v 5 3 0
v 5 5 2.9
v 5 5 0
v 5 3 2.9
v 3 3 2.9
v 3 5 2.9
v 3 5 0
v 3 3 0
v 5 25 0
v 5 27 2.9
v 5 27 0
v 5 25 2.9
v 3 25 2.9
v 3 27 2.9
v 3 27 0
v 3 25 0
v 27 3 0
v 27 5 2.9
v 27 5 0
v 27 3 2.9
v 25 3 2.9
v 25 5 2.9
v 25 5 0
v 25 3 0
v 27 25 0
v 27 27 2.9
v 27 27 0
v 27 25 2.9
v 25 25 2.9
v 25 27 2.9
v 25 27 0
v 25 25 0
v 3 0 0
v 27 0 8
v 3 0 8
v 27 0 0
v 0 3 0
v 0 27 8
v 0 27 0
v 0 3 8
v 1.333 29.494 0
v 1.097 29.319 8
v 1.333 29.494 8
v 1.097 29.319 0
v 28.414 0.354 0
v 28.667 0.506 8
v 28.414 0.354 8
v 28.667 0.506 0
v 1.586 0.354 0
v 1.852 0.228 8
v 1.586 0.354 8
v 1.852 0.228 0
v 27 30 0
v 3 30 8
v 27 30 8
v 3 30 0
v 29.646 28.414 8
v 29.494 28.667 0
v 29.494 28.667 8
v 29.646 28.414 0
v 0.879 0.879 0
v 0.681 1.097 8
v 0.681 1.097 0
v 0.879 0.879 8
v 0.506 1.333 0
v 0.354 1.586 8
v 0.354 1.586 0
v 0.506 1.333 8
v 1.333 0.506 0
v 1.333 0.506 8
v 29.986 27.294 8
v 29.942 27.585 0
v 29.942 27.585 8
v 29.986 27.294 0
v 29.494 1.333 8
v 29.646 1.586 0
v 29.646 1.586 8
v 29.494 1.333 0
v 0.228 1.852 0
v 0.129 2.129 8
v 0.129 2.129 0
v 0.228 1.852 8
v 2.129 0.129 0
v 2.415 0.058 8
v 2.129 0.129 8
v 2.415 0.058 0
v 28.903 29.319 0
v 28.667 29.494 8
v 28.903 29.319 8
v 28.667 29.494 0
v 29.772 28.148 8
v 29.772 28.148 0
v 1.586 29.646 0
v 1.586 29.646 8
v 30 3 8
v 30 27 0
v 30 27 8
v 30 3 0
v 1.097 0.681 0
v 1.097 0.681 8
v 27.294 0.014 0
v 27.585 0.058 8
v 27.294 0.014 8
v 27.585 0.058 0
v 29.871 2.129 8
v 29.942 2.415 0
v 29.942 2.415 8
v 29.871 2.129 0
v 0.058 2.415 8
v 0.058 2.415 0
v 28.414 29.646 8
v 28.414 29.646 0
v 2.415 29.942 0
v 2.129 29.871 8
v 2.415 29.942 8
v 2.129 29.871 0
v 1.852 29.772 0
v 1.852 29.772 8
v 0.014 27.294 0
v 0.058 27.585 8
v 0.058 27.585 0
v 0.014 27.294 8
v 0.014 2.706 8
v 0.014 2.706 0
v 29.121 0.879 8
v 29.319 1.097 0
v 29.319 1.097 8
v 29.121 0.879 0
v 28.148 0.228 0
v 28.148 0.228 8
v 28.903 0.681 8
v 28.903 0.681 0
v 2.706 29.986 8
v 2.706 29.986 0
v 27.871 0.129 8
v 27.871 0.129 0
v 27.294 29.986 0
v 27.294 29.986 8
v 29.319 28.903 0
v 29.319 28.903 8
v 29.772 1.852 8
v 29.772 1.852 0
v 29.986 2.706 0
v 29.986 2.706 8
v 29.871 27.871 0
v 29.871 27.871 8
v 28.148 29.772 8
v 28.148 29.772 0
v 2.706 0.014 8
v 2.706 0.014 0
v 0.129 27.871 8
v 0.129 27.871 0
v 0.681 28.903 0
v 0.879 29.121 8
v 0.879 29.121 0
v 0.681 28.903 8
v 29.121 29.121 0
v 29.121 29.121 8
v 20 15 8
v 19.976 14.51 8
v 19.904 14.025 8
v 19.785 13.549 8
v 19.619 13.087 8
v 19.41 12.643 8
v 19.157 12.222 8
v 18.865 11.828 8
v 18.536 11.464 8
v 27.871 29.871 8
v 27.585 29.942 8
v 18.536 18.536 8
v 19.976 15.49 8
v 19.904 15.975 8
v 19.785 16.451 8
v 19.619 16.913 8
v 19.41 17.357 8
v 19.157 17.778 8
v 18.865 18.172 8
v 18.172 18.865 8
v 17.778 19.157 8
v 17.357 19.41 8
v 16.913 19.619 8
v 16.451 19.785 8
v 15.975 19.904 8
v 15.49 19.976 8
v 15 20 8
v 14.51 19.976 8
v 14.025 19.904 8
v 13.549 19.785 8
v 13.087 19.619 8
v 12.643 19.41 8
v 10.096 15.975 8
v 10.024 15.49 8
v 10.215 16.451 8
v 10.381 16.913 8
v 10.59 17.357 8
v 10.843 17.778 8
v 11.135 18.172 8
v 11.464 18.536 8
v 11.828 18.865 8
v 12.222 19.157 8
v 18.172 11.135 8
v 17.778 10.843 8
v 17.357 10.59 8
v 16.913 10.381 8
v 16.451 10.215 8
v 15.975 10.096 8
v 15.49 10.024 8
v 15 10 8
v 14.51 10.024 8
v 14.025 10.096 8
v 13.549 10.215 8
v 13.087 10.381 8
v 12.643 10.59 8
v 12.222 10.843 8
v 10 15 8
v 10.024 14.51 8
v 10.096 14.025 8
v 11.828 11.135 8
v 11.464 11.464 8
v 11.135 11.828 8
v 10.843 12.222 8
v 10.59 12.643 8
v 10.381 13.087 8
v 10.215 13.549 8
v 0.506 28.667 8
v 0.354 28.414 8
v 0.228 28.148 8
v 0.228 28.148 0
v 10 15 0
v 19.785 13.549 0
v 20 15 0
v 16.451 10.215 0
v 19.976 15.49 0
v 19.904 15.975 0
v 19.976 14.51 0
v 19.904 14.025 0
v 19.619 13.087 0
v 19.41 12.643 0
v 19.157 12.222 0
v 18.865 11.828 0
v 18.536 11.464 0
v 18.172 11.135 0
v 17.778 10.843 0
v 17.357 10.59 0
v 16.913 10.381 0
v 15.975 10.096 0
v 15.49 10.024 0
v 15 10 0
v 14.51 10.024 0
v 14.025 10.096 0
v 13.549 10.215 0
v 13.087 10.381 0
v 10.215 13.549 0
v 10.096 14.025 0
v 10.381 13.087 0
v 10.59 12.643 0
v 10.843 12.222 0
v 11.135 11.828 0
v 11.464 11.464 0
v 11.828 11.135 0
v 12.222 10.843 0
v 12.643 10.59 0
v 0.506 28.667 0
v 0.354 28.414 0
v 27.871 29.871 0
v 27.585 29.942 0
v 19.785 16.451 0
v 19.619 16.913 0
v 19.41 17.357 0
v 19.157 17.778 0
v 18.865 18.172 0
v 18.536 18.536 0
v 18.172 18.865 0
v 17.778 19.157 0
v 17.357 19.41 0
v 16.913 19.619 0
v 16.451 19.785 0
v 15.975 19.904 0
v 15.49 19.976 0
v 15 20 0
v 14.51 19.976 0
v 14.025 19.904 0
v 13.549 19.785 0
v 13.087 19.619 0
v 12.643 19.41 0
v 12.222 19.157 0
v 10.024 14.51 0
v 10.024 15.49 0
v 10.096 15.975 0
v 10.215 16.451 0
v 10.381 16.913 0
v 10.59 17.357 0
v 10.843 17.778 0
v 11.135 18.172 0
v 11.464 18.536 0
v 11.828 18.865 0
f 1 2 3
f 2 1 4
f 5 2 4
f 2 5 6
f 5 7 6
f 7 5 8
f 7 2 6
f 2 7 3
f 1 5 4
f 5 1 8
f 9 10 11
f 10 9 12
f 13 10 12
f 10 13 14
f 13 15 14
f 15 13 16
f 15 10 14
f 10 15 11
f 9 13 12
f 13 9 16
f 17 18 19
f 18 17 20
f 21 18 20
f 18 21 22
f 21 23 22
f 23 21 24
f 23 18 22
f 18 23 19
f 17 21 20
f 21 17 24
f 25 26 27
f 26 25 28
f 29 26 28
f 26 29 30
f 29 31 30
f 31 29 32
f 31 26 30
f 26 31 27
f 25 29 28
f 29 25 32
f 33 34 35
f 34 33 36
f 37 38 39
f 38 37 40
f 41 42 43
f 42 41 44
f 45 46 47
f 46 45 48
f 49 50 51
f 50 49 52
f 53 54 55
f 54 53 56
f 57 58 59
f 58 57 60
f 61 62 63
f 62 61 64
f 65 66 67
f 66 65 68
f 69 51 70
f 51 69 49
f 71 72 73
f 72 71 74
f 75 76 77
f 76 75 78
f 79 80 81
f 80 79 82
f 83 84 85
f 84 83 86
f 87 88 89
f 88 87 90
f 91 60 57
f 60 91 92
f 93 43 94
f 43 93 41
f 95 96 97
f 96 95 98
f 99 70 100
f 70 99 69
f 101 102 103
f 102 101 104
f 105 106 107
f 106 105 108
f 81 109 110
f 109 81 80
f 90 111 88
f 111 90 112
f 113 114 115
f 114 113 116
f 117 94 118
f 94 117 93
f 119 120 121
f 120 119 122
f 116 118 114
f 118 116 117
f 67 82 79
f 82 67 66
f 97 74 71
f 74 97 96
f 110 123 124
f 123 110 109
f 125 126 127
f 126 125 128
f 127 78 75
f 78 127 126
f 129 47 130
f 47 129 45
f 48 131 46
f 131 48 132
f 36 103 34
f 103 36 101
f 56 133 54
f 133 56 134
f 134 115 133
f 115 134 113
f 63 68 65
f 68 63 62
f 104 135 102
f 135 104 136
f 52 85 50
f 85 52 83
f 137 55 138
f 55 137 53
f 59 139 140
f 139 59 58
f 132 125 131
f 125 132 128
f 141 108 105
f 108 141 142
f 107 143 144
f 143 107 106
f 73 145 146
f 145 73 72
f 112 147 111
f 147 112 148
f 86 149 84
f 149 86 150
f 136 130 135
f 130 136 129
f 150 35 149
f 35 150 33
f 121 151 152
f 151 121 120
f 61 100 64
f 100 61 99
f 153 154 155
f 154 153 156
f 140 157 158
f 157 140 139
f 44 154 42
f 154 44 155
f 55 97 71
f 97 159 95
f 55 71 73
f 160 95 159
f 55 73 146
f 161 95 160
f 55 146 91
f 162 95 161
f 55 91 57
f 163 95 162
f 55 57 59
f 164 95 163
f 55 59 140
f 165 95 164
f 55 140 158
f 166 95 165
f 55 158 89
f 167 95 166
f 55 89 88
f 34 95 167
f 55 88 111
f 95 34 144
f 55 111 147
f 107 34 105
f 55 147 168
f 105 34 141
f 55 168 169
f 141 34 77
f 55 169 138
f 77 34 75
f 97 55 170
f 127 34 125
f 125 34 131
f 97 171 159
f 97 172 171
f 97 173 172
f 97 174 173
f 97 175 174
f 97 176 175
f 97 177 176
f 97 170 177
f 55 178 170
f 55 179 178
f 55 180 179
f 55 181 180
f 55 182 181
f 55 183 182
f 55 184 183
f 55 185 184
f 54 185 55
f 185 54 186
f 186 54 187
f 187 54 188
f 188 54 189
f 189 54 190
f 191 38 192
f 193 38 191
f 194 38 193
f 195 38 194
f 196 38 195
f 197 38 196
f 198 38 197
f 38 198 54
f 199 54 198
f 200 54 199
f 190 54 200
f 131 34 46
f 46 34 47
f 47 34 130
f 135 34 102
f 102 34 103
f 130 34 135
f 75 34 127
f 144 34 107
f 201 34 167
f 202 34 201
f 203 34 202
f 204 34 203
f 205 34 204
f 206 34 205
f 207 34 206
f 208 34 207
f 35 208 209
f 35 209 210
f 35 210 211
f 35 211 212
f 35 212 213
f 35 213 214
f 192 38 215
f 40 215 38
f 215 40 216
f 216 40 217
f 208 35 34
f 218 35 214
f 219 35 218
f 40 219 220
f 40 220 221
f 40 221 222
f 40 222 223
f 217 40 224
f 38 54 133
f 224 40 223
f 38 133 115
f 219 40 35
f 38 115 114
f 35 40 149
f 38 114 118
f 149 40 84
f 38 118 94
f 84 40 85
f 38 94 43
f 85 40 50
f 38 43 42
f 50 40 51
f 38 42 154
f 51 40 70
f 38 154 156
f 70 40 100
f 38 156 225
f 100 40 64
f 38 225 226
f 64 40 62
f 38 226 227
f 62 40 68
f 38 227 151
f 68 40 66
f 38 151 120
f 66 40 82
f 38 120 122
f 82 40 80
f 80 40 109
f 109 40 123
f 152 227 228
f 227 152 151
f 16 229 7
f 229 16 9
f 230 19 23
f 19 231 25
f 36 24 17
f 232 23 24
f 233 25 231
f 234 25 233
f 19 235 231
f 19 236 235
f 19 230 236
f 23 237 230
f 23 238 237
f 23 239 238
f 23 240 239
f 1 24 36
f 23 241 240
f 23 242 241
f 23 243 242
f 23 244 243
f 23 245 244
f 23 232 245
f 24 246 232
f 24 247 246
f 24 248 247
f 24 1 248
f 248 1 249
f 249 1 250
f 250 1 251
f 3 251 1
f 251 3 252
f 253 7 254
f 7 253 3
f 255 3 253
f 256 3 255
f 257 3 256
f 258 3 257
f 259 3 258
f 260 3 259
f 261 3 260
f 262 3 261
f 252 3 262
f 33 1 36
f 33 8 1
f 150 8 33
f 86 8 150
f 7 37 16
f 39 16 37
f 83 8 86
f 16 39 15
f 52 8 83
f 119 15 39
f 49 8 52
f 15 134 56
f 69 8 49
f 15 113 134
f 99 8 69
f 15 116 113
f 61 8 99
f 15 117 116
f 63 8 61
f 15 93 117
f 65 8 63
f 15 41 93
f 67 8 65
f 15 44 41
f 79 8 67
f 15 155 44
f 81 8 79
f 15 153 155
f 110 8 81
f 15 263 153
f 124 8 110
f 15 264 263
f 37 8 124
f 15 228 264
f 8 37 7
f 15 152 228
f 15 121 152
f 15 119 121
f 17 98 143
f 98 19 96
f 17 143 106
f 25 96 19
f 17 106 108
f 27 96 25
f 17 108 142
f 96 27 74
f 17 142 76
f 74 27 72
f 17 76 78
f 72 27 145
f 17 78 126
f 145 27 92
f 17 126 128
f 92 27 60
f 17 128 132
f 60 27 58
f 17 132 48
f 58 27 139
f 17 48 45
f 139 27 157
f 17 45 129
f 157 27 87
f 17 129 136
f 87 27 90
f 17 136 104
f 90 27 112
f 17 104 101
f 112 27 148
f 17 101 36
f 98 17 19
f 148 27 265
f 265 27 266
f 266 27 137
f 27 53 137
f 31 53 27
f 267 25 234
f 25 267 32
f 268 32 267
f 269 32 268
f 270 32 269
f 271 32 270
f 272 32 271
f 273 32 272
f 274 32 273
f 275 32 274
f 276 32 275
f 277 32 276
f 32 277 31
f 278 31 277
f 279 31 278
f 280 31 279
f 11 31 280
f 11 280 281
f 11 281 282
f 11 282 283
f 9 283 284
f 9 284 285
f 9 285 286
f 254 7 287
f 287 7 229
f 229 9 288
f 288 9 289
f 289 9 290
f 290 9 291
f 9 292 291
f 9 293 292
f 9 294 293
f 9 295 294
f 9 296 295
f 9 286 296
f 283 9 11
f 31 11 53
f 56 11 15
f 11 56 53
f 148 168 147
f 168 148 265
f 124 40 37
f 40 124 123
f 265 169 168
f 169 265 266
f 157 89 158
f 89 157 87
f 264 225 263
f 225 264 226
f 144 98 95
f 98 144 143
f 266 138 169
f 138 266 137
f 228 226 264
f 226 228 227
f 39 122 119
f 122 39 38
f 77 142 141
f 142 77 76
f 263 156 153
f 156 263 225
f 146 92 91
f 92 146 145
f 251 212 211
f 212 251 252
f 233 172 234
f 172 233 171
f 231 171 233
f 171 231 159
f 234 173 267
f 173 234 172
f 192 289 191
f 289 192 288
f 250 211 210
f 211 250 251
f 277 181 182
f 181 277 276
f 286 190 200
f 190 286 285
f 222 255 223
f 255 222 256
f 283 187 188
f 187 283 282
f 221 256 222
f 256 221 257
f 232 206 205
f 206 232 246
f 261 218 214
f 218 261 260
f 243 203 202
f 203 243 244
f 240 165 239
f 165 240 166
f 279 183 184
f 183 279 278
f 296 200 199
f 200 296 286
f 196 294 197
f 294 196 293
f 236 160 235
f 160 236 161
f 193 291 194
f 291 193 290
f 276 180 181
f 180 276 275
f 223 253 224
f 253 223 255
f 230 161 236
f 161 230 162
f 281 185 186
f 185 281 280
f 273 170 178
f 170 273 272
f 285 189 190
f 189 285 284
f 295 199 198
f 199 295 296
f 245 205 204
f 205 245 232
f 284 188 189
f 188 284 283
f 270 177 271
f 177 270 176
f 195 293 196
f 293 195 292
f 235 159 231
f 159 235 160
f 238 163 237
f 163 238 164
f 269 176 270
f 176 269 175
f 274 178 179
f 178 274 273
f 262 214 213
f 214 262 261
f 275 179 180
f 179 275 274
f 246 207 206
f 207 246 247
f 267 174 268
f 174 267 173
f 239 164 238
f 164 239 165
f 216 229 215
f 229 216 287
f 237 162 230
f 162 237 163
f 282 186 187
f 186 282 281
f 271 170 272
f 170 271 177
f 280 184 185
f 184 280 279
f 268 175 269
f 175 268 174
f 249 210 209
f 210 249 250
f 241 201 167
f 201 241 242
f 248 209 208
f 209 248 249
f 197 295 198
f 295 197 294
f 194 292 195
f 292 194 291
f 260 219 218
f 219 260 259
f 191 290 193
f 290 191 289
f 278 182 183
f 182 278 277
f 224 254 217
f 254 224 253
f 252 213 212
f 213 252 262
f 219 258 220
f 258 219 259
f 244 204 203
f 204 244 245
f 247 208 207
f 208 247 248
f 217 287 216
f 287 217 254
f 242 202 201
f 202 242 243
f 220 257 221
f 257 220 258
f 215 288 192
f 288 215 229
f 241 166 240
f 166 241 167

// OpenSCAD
// file: params.scad
// Cat Feeder 5000 — Shared Parameters & Common Modules
// Include this file first in all part files: include <params.scad>

// ===== DIMENSIONS =====
WALL = 3;                // Standard wall thickness (mm)
THIN_WALL = 2.5;         // Thin walls (antenna arch, etc.)
FLOOR = 4;               // Base floor thickness
INSERT_BORE = 4.7;       // M3 heat-set insert pocket bore
M3_CLEAR = 3.4;          // M3 clearance hole
UNIT_W = 160;            // Main body width
UNIT_D = 240;            // Main body depth
UNIT_H = 160;            // Main body height
GATE_W = 118;            // Gate flap width
GATE_H = 90;             // Gate flap height
GATE_T = 3;              // Gate flap thickness
GATE_ROD_D = 3.2;        // Gate hinge rod diameter
ARCH_SPAN = 160;         // Antenna arch left-to-right span
ARCH_H = 70;             // Antenna arch height
ARCH_D = 40;             // Antenna arch depth (front-to-back)
COIL_CH_W = 16;          // Coil channel width
COIL_CH_D = 5;           // Coil channel depth
SERVO_W = 23;            // SG90 servo width
SERVO_D = 12.5;          // SG90 servo depth
SERVO_H = 30;            // SG90 servo height
SERVO_EAR_SPAN = 28;     // SG90 servo ear spacing
TOLERANCE = 0.1;         // General fit tolerance

// ===== RENDER QUALITY =====
$fn = 64;                // Circle resolution (smooth curves)

// ===== COLORS =====
COL_RFID = [0.8, 0.2, 0.2, 0.8];      // Red — RFID antenna arch
COL_TPU = [0.4, 0.7, 0.3, 0.8];       // Green — TPU flexible parts
COL_GATE = [0.2, 0.5, 0.8, 0.8];      // Blue — Gate mechanism
COL_BODY = [0.6, 0.6, 0.6, 0.8];      // Gray — Main body structure

// ===== COMMON MODULES =====

// M3 heat-set insert pocket (bore hole for pressed insert)
module m3_insert(h = 8) {
    cylinder(d = INSERT_BORE, h = h);
}

// M3 clearance hole (for bolt pass-through)
module m3_clear(h = 8) {
    cylinder(d = M3_CLEAR, h = h);
}

// Fillet box: rectangular box with filleted corners
// w, d, h = width, depth, height; r = corner radius
module fillet_box(w, d, h, r = 2) {
    hull() {
        translate([r, r, 0])
            cylinder(r = r, h = h);
        translate([w - r, r, 0])
            cylinder(r = r, h = h);
        translate([r, d - r, 0])
            cylinder(r = r, h = h);
        translate([w - r, d - r, 0])
            cylinder(r = r, h = h);
    }
}

// Boss: raised circular pad with M3 pocket
// Useful for internal reinforcement at bolt points
module boss(d = 10, h = 4, pocket = true) {
    difference() {
        cylinder(d = d, h = h);
        if (pocket)
            translate([0, 0, -0.1])
                m3_clear(h = h + 0.2);
    }
}
// main file
// Cat Feeder 5000 — Part 12: Camera Cover / Bezel
// Cosmetic trim and lens protection.
// Print: PETG, 0.2mm layers, 20% infill, no supports

include <params.scad>

color(COL_BODY) camera_bezel();

module camera_bezel() {
    BW = 30; BD = 30; BH = 8;

    difference() {
        fillet_box(BW, BD, BH, r=3);
        // Lens opening (Ø10mm)
        translate([BW/2, BD/2, -0.1])
            cylinder(d=10, h=BH + 0.2);
        // Snap clip recesses (4× corners)
        for (x=[3, BW-5]) for (y=[3, BD-5])
            translate([x, y, -0.1])
                cube([2, 2, 3]);
    }
}
